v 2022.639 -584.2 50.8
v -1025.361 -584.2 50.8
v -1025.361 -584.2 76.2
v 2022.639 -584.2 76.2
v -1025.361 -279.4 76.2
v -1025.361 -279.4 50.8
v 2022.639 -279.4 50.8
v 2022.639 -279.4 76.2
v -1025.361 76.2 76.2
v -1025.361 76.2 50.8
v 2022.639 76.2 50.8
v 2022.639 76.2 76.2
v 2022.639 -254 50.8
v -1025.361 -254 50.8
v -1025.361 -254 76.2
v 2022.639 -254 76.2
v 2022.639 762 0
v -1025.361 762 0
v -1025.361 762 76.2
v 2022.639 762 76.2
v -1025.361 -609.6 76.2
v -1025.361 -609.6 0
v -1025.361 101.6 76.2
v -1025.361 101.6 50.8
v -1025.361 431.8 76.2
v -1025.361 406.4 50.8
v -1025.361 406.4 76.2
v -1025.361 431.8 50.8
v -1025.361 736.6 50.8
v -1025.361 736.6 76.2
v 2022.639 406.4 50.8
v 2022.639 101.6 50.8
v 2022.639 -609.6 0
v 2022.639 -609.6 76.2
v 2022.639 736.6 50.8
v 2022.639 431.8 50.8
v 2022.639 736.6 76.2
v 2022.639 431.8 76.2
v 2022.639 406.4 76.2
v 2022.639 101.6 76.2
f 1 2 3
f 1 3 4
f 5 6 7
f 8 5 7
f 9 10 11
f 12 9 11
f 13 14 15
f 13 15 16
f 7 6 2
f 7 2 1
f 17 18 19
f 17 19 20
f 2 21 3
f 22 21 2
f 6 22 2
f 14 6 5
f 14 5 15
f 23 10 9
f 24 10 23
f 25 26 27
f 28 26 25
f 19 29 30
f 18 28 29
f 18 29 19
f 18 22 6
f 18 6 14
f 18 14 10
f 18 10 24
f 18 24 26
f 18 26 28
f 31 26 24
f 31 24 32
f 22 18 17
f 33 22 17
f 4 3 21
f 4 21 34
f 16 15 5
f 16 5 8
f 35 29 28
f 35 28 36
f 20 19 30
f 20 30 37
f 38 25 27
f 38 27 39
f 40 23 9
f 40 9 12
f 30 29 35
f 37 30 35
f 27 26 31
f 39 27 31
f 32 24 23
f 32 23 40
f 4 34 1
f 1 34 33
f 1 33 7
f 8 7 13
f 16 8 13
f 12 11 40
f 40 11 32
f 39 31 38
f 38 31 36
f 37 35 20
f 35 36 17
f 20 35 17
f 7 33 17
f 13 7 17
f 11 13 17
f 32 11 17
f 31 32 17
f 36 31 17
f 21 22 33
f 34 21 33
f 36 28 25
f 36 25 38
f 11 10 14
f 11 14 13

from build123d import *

# Parameters (mm, degrees)
F0_W     = 3048
F0_H     = 1371.6
F1_DEPTH = 50.8
F2_W     = 3048
F2_H     = 25.4
F3_DEPTH = 25.4


with BuildPart() as f1:
    # F0 (on Top) → F1 (new body)
    with BuildSketch(Plane.XY):
        with Locations((498.638901, 76.2)):
            Rectangle(F0_W, F0_H)
    extrude(amount=F1_DEPTH)

    # F2 (on face) → F3 (join)
    with BuildSketch(Plane.XY.offset(50.8)):
        with Locations((498.638901, 749.3)):
            Rectangle(F2_W, F2_H)
        with Locations((498.638901, 419.1)):
            Rectangle(F2_W, F2_H)
        with Locations((498.638901, 88.9)):
            Rectangle(F2_W, F2_H)
        with Locations((498.638901, -266.7)):
            Rectangle(F2_W, F2_H)
        with Locations((498.638901, -596.9)):
            Rectangle(F2_W, F2_H)
    extrude(amount=F3_DEPTH)


solid = f1.part
